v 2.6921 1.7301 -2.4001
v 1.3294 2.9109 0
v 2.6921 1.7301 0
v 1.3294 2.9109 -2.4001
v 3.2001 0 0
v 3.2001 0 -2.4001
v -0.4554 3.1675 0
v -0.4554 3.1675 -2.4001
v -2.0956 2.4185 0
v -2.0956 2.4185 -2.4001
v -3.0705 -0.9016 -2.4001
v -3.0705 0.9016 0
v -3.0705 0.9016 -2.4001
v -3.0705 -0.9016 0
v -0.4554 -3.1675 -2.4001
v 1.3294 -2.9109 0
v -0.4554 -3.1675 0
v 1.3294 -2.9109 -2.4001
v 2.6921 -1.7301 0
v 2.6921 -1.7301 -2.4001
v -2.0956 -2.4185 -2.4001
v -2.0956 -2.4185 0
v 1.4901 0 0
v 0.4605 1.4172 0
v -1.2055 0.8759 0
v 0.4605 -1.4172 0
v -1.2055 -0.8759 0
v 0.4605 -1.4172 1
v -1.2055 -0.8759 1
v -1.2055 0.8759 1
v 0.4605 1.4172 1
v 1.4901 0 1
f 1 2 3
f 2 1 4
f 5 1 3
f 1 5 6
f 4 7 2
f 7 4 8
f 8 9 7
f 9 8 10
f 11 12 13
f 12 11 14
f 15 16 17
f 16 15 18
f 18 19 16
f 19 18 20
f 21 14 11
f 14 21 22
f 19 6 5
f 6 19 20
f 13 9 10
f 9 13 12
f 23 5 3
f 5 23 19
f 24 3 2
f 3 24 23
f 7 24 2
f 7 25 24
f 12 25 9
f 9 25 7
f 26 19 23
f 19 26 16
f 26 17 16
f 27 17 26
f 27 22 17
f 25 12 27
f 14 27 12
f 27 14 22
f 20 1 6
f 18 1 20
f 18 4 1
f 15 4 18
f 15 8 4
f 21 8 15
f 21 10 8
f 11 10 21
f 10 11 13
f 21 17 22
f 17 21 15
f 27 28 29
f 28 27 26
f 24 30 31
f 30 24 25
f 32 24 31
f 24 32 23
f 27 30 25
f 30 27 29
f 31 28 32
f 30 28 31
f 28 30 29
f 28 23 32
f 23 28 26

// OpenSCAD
// License: GPL 2.0

//testNutsAndBolts();

module testNutsAndBolts()
{
	$fn = 360;
	translate([0,15])nutHole(3, proj=2);
	boltHole(3, length= 30, proj=2);
}

MM = "mm";
INCH = "inch"; //Not yet supported

//Based on: http://www.roymech.co.uk/Useful_Tables/Screws/Hex_Screws.htm
METRIC_NUT_AC_WIDTHS = 
[
	-1, //0 index is not used but reduces computation
	-1,
	-1,
	6.40,//m3
	8.10,//m4
	9.20,//m5
	11.50,//m6
	-1,
	15.00,//m8
	-1,
	19.60,//m10
	-1,
	22.10,//m12
	-1,
	-1,
	-1,
	27.70,//m16
	-1,
	-1,
	-1,
	34.60,//m20
	-1,
	-1,
	-1,
	41.60,//m24
	-1,
	-1,
	-1,
	-1,
	-1,
	53.1,//m30
	-1,
	-1,
	-1,
	-1,
	-1,
	63.5//m36
];
METRIC_NUT_THICKNESS =
[
	-1, //0 index is not used but reduces computation
	-1,
	-1,
	2.40,//m3
	3.20,//m4
	4.00,//m5
	5.00,//m6
	-1,
	6.50,//m8
	-1,
	8.00,//m10
	-1,
	10.00,//m12
	-1,
	-1,
	-1,
	13.00,//m16
	-1,
	-1,
	-1,
	16.00//m20
	-1,
	-1,
	-1,
	19.00,//m24
	-1,
	-1,
	-1,
	-1,
	-1,
	24.00,//m30
	-1,
	-1,
	-1,
	-1,
	-1,
	29.00//m36
];

COURSE_METRIC_BOLT_MAJOR_THREAD_DIAMETERS = 
[//based on max values
	-1, //0 index is not used but reduces computation
	-1,
	-1,
	2.98,//m3
	3.978,//m4
	4.976,//m5
	5.974,//m6
	-1,
	7.972,//m8
	-1,
	9.968,//m10
	-1,
	11.966,//m12
	-1,
	-1,
	-1,
	15.962,//m16
	-1,
	-1,
	-1,
	19.958,//m20
	-1,
	-1,
	-1,
	23.952,//m24
	-1,
	-1,
	-1,
	-1,
	-1,
	29.947,//m30
	-1,
	-1,
	-1,
	-1,
	-1,
	35.940//m36
];

module nutHole(size, units=MM, tolerance = +0.0001, proj = -1)
{
	//takes a metric screw/nut size and looksup nut dimensions
	radius = METRIC_NUT_AC_WIDTHS[size]/2+tolerance;
	height = METRIC_NUT_THICKNESS[size]+tolerance;
	if (proj == -1)
	{
		cylinder(r= radius, h=height, $fn = 6, center=[0,0]);
	}
	if (proj == 1)
	{
		circle(r= radius, $fn = 6);
	}
	if (proj == 2)
	{
		translate([-radius/2, 0])
			square([radius*2, height]);
	}
}

module boltHole(size, units=MM, length, tolerance = +0.0001, proj = -1)
{
	radius = COURSE_METRIC_BOLT_MAJOR_THREAD_DIAMETERS[size]/2+tolerance;
//TODO: proper screw cap values
	capHeight = METRIC_NUT_THICKNESS[size]+tolerance; //METRIC_BOLT_CAP_HEIGHTS[size]+tolerance;
	capRadius = METRIC_NUT_AC_WIDTHS[size]/2+tolerance; //METRIC_BOLT_CAP_RADIUS[size]+tolerance;
	
	if (proj == -1)
	{
	translate([0, 0, -capHeight])
		cylinder(r= capRadius, h=capHeight);
	cylinder(r = radius, h = length);
	}
	if (proj == 1)
	{
		circle(r = radius);
	}
	if (proj == 2)
	{
		translate([-capRadius/2, -capHeight])
			square([capRadius*2, capHeight]);
		square([radius*2, length]);
	}
}
boltHole(3);
